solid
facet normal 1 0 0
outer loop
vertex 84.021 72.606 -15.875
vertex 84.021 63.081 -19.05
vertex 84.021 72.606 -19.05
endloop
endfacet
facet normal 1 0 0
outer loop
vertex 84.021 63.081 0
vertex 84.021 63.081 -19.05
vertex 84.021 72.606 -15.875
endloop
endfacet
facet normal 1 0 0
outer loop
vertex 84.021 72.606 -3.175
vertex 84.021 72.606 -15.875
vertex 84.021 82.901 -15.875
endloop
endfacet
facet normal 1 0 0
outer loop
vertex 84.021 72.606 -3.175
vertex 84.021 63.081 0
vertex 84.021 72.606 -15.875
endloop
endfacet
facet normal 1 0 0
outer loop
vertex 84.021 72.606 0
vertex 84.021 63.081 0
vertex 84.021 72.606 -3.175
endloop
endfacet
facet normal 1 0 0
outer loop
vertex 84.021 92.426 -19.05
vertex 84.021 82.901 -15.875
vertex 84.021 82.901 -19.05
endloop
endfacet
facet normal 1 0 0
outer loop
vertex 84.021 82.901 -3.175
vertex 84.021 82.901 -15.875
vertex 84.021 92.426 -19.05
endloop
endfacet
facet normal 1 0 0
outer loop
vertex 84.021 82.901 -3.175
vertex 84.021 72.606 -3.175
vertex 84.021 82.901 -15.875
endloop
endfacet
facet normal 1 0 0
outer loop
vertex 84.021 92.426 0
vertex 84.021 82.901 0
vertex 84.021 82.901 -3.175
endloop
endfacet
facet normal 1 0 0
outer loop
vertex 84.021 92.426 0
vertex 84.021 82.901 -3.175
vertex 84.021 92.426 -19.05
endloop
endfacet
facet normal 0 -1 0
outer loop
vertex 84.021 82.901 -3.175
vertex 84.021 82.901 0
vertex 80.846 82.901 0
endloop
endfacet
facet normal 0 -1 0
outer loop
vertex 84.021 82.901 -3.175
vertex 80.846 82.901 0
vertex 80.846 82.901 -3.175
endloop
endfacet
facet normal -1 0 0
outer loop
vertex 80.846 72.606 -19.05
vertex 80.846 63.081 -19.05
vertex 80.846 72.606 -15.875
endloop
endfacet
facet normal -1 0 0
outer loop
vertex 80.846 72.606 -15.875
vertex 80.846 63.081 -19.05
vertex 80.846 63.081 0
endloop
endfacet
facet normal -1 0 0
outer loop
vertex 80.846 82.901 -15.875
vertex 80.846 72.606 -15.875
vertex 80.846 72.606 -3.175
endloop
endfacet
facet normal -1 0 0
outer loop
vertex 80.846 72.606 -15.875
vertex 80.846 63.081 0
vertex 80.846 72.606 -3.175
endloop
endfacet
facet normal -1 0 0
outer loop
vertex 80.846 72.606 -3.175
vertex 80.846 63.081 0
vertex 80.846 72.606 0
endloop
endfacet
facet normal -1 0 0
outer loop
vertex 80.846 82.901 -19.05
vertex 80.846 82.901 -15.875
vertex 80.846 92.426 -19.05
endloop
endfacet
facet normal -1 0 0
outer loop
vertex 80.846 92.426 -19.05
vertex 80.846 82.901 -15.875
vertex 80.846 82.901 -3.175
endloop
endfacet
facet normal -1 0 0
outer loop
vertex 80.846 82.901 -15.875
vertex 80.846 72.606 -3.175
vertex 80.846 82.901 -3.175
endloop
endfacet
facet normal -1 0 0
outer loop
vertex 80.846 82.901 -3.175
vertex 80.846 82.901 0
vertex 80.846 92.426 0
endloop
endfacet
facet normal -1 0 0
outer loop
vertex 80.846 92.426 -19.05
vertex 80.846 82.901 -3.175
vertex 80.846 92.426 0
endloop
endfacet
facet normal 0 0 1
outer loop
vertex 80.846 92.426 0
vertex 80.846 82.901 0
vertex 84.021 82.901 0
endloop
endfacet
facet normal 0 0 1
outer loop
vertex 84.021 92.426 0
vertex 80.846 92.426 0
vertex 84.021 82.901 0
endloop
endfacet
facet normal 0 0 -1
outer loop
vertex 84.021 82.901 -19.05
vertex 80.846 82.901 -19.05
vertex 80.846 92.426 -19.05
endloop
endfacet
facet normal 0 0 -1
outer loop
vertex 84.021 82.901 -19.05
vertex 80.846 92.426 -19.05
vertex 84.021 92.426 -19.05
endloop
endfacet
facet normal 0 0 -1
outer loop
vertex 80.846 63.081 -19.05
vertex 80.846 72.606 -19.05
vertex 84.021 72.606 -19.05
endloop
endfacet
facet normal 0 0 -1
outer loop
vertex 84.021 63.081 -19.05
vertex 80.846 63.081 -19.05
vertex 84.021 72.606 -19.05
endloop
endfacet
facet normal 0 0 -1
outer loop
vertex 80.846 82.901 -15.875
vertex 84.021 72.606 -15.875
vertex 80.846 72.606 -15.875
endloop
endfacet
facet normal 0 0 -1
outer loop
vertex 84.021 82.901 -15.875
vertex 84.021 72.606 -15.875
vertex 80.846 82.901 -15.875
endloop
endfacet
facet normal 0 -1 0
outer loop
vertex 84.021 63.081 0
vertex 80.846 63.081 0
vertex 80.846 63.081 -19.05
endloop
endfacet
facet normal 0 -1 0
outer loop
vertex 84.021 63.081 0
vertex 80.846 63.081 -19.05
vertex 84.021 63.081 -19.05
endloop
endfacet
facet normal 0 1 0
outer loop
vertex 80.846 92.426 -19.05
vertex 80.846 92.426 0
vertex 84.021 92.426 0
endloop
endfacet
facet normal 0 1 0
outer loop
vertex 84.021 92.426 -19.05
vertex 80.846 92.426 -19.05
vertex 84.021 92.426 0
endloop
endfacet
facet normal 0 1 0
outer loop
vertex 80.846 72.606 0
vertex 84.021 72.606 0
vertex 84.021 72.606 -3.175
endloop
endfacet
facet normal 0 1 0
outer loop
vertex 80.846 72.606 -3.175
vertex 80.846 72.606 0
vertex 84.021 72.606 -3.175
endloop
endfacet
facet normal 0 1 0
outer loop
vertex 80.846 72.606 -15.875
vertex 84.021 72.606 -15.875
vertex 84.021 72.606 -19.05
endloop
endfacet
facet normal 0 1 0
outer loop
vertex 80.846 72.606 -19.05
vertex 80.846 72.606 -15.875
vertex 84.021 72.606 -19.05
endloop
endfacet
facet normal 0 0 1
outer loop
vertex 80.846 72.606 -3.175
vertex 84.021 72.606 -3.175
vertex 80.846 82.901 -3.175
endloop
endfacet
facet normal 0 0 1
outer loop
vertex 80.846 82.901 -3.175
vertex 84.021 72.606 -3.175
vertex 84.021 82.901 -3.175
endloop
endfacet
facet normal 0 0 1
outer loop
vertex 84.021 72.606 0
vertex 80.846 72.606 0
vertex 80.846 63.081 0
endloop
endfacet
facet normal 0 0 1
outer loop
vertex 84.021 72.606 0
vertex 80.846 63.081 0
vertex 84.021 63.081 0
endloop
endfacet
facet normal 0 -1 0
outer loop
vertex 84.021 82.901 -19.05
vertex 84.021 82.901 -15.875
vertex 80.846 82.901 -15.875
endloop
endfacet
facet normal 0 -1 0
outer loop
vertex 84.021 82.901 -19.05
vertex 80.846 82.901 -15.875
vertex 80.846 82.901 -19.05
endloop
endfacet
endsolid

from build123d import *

# Parameters (mm, degrees)
SKETCH1_W           = 3.175
SKETCH1_H           = 29.34469697
BOSS_EXTRUDE1_DEPTH = 19.05
SKETCH2_W           = 3.175
SKETCH2_H           = 10.29469697
CUT_EXTRUDE1_DEPTH  = 5.08


with BuildPart() as part:
    # Sketch1 → Boss-Extrude1 (new body)
    with BuildSketch(Plane.XY):
        with Locations((82.43330737, 77.753797109)):
            Rectangle(SKETCH1_W, SKETCH1_H)
    extrude(amount=-BOSS_EXTRUDE1_DEPTH)

    # Sketch2 → Cut-Extrude1 (cut)
    with BuildSketch(Plane(origin=(84.02080737, 0, 0), x_dir=(0, 0, -1), z_dir=(1, 0, 0))):
        with Locations((1.5875, 77.753797109)):
            Rectangle(SKETCH2_W, SKETCH2_H)
        with Locations((17.4625, 77.753797109)):
            Rectangle(SKETCH2_W, SKETCH2_H)
    extrude(amount=-CUT_EXTRUDE1_DEPTH, mode=Mode.SUBTRACT)


solid = part.part
